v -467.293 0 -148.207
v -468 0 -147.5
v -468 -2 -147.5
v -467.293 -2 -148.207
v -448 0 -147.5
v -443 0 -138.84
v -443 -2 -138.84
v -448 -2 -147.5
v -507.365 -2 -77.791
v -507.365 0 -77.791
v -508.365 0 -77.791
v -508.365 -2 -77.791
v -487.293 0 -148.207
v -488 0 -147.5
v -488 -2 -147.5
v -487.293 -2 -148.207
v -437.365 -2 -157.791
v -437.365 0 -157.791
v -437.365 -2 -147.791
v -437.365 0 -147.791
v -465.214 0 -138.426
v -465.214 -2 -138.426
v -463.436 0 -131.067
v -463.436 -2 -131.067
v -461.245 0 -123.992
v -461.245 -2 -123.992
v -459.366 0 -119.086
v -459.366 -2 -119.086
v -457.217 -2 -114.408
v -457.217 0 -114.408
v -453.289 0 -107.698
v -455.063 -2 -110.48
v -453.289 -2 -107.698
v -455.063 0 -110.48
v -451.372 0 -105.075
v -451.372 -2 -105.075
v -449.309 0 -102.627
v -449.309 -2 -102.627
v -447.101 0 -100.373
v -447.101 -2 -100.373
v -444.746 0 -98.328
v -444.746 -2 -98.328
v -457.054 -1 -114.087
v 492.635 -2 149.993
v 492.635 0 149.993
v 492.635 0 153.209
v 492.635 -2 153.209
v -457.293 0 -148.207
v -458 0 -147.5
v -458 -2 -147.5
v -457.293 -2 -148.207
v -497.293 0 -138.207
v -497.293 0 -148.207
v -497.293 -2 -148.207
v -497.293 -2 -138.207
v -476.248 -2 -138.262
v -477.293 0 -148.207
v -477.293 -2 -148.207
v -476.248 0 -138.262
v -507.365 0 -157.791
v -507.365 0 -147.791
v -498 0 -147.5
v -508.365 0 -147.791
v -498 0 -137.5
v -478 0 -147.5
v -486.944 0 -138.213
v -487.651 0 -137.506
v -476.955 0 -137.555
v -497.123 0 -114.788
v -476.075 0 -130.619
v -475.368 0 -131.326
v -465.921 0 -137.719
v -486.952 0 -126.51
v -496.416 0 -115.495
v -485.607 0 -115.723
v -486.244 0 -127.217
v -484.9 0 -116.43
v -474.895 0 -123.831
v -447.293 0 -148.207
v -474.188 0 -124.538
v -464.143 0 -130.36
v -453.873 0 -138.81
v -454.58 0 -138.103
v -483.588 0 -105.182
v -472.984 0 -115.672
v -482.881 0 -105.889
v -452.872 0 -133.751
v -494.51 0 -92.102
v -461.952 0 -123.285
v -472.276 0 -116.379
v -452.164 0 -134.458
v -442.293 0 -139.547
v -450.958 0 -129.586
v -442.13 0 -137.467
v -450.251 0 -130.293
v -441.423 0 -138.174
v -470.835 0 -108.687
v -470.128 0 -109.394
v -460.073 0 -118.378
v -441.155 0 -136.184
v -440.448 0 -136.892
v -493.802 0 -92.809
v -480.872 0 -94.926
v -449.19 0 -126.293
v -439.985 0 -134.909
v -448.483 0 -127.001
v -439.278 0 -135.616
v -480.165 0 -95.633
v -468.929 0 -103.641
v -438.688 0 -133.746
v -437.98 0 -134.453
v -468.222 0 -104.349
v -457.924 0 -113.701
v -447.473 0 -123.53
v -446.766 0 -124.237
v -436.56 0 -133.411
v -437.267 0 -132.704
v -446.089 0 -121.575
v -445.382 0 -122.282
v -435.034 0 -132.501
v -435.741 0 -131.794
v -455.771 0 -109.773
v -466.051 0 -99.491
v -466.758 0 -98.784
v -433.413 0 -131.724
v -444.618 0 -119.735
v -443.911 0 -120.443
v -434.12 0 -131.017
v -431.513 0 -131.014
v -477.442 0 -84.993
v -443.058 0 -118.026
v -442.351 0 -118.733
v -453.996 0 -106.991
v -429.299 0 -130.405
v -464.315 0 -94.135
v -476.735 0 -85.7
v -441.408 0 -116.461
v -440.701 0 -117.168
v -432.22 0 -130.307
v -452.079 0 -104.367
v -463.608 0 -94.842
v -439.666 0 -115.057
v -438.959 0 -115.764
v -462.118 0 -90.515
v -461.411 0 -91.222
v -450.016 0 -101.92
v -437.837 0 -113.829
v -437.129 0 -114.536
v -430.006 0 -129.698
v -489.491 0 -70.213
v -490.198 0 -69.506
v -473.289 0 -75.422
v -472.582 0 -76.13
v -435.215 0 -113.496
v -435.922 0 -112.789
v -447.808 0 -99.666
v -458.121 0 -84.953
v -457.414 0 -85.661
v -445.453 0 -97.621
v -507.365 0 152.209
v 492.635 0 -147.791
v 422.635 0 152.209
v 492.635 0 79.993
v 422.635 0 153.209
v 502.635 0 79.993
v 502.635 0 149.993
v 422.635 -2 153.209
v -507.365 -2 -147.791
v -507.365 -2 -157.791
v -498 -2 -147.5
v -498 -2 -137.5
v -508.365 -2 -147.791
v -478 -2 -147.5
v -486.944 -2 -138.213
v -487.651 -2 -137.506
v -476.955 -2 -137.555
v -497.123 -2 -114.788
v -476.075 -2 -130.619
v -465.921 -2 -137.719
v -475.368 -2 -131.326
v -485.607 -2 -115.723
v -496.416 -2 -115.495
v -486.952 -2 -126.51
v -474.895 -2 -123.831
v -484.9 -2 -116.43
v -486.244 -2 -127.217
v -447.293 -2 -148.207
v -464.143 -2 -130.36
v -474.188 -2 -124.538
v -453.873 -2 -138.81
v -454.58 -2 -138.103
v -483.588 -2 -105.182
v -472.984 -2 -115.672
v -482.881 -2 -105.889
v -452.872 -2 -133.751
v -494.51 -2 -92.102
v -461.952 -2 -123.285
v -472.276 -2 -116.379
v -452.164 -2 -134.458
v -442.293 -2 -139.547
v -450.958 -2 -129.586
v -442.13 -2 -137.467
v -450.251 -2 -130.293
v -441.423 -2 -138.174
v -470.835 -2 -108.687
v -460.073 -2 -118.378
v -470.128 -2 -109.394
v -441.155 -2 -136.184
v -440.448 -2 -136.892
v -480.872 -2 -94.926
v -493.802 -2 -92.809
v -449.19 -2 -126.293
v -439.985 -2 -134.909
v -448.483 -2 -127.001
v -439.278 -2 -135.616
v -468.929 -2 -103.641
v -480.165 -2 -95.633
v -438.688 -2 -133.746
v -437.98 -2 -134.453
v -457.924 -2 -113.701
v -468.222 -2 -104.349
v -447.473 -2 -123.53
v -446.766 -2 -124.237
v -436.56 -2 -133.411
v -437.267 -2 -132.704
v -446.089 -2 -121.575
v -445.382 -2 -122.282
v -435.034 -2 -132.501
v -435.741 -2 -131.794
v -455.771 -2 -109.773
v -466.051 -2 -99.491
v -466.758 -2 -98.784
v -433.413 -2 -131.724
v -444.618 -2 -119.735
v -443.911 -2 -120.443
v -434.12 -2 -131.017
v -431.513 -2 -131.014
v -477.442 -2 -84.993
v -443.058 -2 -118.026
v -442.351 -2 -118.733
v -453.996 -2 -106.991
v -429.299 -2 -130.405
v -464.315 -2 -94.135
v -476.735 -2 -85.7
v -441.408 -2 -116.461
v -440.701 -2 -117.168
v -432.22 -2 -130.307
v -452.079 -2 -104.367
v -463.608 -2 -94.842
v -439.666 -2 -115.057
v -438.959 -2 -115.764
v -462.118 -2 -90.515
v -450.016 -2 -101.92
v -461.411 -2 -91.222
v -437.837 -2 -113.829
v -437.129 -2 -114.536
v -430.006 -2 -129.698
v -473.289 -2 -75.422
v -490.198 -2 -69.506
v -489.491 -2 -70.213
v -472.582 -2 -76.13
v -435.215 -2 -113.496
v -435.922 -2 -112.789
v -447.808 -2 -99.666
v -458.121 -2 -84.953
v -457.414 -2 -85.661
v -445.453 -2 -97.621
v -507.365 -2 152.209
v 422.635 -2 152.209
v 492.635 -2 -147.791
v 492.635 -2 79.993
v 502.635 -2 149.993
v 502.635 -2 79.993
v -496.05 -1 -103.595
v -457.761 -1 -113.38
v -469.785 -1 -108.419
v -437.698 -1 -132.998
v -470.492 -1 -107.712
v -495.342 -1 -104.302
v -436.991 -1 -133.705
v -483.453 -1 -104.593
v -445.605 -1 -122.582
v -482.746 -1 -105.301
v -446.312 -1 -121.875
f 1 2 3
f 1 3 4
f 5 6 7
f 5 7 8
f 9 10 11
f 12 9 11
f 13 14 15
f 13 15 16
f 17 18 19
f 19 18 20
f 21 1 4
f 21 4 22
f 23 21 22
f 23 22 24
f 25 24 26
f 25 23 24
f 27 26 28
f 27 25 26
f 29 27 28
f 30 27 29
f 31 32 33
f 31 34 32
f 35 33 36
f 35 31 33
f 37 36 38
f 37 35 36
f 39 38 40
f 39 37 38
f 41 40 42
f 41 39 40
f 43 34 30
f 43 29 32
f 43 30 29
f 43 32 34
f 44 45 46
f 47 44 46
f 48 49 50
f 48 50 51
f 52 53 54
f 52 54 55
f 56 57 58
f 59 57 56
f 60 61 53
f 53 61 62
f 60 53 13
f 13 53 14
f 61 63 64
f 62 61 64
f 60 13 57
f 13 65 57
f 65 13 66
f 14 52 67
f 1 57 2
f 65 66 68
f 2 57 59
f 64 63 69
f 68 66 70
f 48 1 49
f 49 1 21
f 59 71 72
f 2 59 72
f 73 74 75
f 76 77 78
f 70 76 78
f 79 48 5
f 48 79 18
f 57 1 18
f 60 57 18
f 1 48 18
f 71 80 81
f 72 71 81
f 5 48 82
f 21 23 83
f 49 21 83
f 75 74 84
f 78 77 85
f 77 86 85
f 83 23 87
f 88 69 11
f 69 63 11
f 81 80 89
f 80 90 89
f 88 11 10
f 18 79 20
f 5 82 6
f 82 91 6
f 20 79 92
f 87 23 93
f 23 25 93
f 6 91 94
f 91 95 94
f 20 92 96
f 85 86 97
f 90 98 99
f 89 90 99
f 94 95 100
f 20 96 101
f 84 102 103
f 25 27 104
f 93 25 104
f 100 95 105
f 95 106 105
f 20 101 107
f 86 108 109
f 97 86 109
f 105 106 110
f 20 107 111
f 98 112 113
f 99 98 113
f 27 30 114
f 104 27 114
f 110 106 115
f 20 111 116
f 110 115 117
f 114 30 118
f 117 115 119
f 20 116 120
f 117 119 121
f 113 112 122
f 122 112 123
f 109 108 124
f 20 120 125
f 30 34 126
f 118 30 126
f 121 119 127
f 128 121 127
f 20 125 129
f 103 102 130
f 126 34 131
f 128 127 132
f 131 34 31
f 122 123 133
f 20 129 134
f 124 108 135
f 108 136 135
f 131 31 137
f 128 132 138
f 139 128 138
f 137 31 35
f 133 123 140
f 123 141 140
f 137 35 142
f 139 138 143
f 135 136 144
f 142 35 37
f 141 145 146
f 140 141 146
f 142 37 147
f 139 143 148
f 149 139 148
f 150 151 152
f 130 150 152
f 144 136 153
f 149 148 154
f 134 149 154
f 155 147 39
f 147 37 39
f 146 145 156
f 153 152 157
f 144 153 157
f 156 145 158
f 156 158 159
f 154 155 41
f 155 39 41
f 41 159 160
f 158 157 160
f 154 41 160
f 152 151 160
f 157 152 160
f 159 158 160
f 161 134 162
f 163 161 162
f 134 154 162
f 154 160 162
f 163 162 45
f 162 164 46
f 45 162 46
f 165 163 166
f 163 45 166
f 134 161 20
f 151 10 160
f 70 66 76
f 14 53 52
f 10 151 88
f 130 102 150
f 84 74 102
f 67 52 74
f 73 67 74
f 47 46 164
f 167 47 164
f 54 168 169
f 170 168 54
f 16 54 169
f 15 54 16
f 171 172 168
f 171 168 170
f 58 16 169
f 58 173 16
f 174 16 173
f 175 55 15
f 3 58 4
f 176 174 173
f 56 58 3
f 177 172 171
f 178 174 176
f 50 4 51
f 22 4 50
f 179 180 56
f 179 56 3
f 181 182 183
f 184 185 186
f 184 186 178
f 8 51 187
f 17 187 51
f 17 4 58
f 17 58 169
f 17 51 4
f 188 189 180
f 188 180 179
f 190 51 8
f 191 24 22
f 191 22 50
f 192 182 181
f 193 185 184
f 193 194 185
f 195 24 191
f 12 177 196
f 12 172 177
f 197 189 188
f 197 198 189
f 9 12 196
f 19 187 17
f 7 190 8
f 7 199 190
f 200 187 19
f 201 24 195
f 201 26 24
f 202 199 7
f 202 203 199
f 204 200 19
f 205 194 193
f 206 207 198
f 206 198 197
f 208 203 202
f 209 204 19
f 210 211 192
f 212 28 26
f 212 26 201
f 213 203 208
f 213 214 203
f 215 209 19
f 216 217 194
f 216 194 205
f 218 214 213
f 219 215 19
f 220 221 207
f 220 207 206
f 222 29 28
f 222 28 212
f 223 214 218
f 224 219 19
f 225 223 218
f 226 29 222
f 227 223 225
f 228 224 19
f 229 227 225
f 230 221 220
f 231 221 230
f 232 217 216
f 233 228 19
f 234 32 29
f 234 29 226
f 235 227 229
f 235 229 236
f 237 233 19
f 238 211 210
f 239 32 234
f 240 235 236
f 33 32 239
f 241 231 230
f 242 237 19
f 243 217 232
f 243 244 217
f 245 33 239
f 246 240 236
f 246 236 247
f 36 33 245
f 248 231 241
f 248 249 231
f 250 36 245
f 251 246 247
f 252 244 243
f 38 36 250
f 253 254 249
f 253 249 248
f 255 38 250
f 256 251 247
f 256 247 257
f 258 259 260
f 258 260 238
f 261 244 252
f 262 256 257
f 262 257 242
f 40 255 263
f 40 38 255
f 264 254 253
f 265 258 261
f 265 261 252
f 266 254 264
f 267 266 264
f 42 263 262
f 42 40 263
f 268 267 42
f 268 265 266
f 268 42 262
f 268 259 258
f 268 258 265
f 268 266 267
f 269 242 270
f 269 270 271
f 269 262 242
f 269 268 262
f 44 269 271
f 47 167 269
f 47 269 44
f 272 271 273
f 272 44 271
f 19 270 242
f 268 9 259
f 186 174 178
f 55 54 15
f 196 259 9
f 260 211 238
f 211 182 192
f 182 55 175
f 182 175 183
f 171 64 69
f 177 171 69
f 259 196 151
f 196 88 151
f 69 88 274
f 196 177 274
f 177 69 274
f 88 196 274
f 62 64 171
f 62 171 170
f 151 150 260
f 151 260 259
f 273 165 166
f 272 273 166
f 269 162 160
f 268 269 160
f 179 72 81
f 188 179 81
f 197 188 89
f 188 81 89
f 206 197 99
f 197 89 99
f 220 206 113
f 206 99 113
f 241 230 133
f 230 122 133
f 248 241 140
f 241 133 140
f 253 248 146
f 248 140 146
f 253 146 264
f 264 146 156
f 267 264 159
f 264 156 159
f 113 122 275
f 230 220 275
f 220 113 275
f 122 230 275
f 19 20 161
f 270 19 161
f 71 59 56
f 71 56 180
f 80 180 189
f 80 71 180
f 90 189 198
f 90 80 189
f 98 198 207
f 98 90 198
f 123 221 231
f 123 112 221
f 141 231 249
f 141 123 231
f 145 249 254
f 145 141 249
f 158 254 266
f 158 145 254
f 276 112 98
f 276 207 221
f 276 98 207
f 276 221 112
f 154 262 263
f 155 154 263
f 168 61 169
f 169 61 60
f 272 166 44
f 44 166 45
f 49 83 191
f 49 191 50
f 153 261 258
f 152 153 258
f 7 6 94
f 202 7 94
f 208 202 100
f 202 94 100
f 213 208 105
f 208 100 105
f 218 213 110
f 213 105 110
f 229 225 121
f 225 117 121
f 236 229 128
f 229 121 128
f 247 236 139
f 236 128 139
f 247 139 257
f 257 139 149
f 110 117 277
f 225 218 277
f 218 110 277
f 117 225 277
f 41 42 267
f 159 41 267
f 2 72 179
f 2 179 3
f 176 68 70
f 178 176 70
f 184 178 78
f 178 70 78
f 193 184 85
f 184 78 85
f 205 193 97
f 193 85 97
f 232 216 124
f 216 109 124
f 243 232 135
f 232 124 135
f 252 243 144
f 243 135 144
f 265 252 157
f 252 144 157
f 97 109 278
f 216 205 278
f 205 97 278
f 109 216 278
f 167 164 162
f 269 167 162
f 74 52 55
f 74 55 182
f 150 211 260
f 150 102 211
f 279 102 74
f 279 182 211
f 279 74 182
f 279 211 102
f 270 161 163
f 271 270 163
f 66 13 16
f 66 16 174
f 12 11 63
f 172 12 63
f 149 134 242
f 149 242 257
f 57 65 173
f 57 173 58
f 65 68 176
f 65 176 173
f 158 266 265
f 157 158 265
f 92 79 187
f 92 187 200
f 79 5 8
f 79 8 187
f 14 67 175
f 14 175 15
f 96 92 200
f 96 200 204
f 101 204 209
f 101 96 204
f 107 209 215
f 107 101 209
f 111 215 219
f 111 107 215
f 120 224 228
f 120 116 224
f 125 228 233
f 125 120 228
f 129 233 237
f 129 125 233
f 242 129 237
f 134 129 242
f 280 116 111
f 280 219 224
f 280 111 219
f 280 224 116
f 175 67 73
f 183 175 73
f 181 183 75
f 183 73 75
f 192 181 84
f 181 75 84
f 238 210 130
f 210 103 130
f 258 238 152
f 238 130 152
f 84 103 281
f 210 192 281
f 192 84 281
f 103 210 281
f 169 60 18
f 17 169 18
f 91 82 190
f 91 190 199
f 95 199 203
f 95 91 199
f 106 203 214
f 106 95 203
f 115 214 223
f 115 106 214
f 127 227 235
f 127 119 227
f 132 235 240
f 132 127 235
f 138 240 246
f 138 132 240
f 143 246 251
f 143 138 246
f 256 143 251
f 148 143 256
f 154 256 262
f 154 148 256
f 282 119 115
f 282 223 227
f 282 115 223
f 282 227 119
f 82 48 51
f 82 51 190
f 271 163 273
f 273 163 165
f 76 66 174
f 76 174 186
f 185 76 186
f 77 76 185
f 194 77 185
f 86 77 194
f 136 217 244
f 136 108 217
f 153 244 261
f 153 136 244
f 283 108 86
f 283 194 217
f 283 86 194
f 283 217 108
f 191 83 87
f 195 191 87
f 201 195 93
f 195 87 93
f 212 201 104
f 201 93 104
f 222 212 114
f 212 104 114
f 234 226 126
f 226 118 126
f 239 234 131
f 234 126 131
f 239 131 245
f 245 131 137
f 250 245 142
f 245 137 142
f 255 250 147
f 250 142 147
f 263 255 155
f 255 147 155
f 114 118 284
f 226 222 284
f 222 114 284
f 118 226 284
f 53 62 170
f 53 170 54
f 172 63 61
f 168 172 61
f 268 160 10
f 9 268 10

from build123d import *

# Parameters (mm, degrees)
EXTRUDE_DEPTH    = 10
EXTRUDE002_DEPTH = 2


with BuildPart() as extrude_body:
    # Extrude001 → Extrude (new body)
    with BuildSketch(Plane(origin=(-497.646447, 5, -142.853553), x_dir=(-1, 0, 0), z_dir=(0, -1, 0))):
        Polygon((0.353553, 4.646447), (-0.353553, 5.353553), (-0.353553, -4.646447), (0.353553, -5.353553), align=None)
        with BuildLine():
            Line((0.353553, -5.353553), (-0.353553, -4.646447))
            add(Edge.make_bspline(
                [(-0.353553, -4.646447), (-0.353553, -38.459309), (-8.155228, -72.64068)],
                knots=[13.797896, 13.797896, 13.797896, 81.348308, 81.348308, 81.348308], degree=2))
            Line((-8.155228, -72.64068), (-7.448121, -73.347786))
            add(Edge.make_bspline(
                [(0.353553, -5.353553), (0.353553, -39.166416), (-7.448121, -73.347786)],
                knots=[13.797896, 13.797896, 13.797896, 81.348308, 81.348308, 81.348308], degree=2))
        make_face()
        Polygon((-9.646447, 4.646447), (-10.353553, 5.353553), (-10.702548, -4.640355), (-9.995442, -5.347462), align=None)
        with BuildLine():
            Line((-9.995442, -5.347462), (-10.702548, -4.640355))
            add(Edge.make_bspline(
                [(-10.702548, -4.640355), (-11.917215, -39.423851), (-25.064253, -66.723956)],
                knots=[-74.623097, -74.623097, -74.623097, -14.39671, -14.39671, -14.39671], degree=2))
            Line((-25.064253, -66.723956), (-24.357146, -67.431063))
            add(Edge.make_bspline(
                [(-9.995442, -5.347462), (-11.210108, -40.130958), (-24.357146, -67.431063)],
                knots=[-74.623097, -74.623097, -74.623097, -14.39671, -14.39671, -14.39671], degree=2))
        make_face()
        Polygon((-19.646447, 4.646447), (-20.353553, 5.353553), (-21.398838, -4.591666), (-20.691731, -5.298772), align=None)
        with BuildLine():
            Line((-20.691731, -5.298772), (-21.398838, -4.591666))
            add(Edge.make_bspline(
                [(-21.398838, -4.591666), (-24.907666, -37.975933), (-40.232738, -57.192965)],
                knots=[-61.054819, -61.054819, -61.054819, -12.899631, -12.899631, -12.899631], degree=2))
            Line((-40.232738, -57.192965), (-39.525631, -57.900072))
            add(Edge.make_bspline(
                [(-20.691731, -5.298772), (-24.200559, -38.68304), (-39.525631, -57.900072)],
                knots=[-61.054819, -61.054819, -61.054819, -12.899631, -12.899631, -12.899631], degree=2))
        make_face()
        Polygon((-29.646447, 4.646447), (-30.353553, 5.353553), (-32.43267, -4.427923), (-31.725564, -5.135029), align=None)
        with BuildLine():
            Line((-31.725564, -5.135029), (-32.43267, -4.427923))
            add(Edge.make_bspline(
                [(-32.43267, -4.427923), (-38.517786, -33.05614), (-52.900072, -44.525631)],
                knots=[-43.534083, -43.534083, -43.534083, -7.65215, -7.65215, -7.65215], degree=2))
            Line((-52.900072, -44.525631), (-52.192965, -45.232738))
            add(Edge.make_bspline(
                [(-31.725564, -5.135029), (-37.810679, -33.763247), (-52.192965, -45.232738)],
                knots=[-43.534083, -43.534083, -43.534083, -7.65215, -7.65215, -7.65215], degree=2))
        make_face()
        Polygon((-39.646447, 4.646447), (-40.353553, 5.353553), (-43.773755, -4.043373), (-43.066648, -4.75048), align=None)
        with BuildLine():
            Line((-43.066648, -4.75048), (-43.773755, -4.043373))
            add(Edge.make_bspline(
                [(-43.773755, -4.043373), (-50.980104, -23.842655), (-62.431063, -29.357146)],
                knots=[-28.503789, -28.503789, -28.503789, -3.409115, -3.409115, -3.409115], degree=2))
            Line((-62.431063, -29.357146), (-61.723956, -30.064253))
            add(Edge.make_bspline(
                [(-43.066648, -4.75048), (-50.272997, -24.549761), (-61.723956, -30.064253)],
                knots=[-28.503789, -28.503789, -28.503789, -3.409115, -3.409115, -3.409115], degree=2))
        make_face()
        Polygon((-49.646447, 4.646447), (-50.353553, 5.353553), (-55.353553, -3.306701), (-54.646447, -4.013807), align=None)
        with BuildLine():
            Line((-54.646447, -4.013807), (-55.353553, -3.306701))
            add(Edge.make_bspline(
                [(-55.353553, -3.306701), (-59.460178, -10.419583), (-68.347786, -12.448121)],
                knots=[-5.337971, -5.337971, -5.337971, 10.390639, 10.390639, 10.390639], degree=2))
            Line((-68.347786, -12.448121), (-67.64068, -13.155228))
            add(Edge.make_bspline(
                [(-54.646447, -4.013807), (-58.753071, -11.126689), (-67.64068, -13.155228)],
                knots=[-5.337971, -5.337971, -5.337971, 10.390639, 10.390639, 10.390639], degree=2))
        make_face()
    extrude(amount=EXTRUDE_DEPTH)


with BuildPart() as cut:
    # Sketch → Extrude002 (new body)
    with BuildSketch(Plane.XZ):
        Polygon((-507.364975, -157.790507), (-437.364975, -157.790507), (-437.364975, -147.790507), (492.635025, -147.790507), (492.635025, 79.992619), (502.635025, 79.992619), (502.635025, 149.992619), (492.635025, 149.992619), (492.635025, 153.209493), (422.635025, 153.209493), (422.635025, 152.209493), (-507.364975, 152.209493), (-507.364975, -77.790507), (-508.364975, -77.790507), (-508.364975, -147.790507), (-507.364975, -147.790507), align=None)
    extrude(amount=EXTRUDE002_DEPTH)

    # Cut: cut Extrude body
    add(extrude_body.part, mode=Mode.SUBTRACT)


solid = cut.part
